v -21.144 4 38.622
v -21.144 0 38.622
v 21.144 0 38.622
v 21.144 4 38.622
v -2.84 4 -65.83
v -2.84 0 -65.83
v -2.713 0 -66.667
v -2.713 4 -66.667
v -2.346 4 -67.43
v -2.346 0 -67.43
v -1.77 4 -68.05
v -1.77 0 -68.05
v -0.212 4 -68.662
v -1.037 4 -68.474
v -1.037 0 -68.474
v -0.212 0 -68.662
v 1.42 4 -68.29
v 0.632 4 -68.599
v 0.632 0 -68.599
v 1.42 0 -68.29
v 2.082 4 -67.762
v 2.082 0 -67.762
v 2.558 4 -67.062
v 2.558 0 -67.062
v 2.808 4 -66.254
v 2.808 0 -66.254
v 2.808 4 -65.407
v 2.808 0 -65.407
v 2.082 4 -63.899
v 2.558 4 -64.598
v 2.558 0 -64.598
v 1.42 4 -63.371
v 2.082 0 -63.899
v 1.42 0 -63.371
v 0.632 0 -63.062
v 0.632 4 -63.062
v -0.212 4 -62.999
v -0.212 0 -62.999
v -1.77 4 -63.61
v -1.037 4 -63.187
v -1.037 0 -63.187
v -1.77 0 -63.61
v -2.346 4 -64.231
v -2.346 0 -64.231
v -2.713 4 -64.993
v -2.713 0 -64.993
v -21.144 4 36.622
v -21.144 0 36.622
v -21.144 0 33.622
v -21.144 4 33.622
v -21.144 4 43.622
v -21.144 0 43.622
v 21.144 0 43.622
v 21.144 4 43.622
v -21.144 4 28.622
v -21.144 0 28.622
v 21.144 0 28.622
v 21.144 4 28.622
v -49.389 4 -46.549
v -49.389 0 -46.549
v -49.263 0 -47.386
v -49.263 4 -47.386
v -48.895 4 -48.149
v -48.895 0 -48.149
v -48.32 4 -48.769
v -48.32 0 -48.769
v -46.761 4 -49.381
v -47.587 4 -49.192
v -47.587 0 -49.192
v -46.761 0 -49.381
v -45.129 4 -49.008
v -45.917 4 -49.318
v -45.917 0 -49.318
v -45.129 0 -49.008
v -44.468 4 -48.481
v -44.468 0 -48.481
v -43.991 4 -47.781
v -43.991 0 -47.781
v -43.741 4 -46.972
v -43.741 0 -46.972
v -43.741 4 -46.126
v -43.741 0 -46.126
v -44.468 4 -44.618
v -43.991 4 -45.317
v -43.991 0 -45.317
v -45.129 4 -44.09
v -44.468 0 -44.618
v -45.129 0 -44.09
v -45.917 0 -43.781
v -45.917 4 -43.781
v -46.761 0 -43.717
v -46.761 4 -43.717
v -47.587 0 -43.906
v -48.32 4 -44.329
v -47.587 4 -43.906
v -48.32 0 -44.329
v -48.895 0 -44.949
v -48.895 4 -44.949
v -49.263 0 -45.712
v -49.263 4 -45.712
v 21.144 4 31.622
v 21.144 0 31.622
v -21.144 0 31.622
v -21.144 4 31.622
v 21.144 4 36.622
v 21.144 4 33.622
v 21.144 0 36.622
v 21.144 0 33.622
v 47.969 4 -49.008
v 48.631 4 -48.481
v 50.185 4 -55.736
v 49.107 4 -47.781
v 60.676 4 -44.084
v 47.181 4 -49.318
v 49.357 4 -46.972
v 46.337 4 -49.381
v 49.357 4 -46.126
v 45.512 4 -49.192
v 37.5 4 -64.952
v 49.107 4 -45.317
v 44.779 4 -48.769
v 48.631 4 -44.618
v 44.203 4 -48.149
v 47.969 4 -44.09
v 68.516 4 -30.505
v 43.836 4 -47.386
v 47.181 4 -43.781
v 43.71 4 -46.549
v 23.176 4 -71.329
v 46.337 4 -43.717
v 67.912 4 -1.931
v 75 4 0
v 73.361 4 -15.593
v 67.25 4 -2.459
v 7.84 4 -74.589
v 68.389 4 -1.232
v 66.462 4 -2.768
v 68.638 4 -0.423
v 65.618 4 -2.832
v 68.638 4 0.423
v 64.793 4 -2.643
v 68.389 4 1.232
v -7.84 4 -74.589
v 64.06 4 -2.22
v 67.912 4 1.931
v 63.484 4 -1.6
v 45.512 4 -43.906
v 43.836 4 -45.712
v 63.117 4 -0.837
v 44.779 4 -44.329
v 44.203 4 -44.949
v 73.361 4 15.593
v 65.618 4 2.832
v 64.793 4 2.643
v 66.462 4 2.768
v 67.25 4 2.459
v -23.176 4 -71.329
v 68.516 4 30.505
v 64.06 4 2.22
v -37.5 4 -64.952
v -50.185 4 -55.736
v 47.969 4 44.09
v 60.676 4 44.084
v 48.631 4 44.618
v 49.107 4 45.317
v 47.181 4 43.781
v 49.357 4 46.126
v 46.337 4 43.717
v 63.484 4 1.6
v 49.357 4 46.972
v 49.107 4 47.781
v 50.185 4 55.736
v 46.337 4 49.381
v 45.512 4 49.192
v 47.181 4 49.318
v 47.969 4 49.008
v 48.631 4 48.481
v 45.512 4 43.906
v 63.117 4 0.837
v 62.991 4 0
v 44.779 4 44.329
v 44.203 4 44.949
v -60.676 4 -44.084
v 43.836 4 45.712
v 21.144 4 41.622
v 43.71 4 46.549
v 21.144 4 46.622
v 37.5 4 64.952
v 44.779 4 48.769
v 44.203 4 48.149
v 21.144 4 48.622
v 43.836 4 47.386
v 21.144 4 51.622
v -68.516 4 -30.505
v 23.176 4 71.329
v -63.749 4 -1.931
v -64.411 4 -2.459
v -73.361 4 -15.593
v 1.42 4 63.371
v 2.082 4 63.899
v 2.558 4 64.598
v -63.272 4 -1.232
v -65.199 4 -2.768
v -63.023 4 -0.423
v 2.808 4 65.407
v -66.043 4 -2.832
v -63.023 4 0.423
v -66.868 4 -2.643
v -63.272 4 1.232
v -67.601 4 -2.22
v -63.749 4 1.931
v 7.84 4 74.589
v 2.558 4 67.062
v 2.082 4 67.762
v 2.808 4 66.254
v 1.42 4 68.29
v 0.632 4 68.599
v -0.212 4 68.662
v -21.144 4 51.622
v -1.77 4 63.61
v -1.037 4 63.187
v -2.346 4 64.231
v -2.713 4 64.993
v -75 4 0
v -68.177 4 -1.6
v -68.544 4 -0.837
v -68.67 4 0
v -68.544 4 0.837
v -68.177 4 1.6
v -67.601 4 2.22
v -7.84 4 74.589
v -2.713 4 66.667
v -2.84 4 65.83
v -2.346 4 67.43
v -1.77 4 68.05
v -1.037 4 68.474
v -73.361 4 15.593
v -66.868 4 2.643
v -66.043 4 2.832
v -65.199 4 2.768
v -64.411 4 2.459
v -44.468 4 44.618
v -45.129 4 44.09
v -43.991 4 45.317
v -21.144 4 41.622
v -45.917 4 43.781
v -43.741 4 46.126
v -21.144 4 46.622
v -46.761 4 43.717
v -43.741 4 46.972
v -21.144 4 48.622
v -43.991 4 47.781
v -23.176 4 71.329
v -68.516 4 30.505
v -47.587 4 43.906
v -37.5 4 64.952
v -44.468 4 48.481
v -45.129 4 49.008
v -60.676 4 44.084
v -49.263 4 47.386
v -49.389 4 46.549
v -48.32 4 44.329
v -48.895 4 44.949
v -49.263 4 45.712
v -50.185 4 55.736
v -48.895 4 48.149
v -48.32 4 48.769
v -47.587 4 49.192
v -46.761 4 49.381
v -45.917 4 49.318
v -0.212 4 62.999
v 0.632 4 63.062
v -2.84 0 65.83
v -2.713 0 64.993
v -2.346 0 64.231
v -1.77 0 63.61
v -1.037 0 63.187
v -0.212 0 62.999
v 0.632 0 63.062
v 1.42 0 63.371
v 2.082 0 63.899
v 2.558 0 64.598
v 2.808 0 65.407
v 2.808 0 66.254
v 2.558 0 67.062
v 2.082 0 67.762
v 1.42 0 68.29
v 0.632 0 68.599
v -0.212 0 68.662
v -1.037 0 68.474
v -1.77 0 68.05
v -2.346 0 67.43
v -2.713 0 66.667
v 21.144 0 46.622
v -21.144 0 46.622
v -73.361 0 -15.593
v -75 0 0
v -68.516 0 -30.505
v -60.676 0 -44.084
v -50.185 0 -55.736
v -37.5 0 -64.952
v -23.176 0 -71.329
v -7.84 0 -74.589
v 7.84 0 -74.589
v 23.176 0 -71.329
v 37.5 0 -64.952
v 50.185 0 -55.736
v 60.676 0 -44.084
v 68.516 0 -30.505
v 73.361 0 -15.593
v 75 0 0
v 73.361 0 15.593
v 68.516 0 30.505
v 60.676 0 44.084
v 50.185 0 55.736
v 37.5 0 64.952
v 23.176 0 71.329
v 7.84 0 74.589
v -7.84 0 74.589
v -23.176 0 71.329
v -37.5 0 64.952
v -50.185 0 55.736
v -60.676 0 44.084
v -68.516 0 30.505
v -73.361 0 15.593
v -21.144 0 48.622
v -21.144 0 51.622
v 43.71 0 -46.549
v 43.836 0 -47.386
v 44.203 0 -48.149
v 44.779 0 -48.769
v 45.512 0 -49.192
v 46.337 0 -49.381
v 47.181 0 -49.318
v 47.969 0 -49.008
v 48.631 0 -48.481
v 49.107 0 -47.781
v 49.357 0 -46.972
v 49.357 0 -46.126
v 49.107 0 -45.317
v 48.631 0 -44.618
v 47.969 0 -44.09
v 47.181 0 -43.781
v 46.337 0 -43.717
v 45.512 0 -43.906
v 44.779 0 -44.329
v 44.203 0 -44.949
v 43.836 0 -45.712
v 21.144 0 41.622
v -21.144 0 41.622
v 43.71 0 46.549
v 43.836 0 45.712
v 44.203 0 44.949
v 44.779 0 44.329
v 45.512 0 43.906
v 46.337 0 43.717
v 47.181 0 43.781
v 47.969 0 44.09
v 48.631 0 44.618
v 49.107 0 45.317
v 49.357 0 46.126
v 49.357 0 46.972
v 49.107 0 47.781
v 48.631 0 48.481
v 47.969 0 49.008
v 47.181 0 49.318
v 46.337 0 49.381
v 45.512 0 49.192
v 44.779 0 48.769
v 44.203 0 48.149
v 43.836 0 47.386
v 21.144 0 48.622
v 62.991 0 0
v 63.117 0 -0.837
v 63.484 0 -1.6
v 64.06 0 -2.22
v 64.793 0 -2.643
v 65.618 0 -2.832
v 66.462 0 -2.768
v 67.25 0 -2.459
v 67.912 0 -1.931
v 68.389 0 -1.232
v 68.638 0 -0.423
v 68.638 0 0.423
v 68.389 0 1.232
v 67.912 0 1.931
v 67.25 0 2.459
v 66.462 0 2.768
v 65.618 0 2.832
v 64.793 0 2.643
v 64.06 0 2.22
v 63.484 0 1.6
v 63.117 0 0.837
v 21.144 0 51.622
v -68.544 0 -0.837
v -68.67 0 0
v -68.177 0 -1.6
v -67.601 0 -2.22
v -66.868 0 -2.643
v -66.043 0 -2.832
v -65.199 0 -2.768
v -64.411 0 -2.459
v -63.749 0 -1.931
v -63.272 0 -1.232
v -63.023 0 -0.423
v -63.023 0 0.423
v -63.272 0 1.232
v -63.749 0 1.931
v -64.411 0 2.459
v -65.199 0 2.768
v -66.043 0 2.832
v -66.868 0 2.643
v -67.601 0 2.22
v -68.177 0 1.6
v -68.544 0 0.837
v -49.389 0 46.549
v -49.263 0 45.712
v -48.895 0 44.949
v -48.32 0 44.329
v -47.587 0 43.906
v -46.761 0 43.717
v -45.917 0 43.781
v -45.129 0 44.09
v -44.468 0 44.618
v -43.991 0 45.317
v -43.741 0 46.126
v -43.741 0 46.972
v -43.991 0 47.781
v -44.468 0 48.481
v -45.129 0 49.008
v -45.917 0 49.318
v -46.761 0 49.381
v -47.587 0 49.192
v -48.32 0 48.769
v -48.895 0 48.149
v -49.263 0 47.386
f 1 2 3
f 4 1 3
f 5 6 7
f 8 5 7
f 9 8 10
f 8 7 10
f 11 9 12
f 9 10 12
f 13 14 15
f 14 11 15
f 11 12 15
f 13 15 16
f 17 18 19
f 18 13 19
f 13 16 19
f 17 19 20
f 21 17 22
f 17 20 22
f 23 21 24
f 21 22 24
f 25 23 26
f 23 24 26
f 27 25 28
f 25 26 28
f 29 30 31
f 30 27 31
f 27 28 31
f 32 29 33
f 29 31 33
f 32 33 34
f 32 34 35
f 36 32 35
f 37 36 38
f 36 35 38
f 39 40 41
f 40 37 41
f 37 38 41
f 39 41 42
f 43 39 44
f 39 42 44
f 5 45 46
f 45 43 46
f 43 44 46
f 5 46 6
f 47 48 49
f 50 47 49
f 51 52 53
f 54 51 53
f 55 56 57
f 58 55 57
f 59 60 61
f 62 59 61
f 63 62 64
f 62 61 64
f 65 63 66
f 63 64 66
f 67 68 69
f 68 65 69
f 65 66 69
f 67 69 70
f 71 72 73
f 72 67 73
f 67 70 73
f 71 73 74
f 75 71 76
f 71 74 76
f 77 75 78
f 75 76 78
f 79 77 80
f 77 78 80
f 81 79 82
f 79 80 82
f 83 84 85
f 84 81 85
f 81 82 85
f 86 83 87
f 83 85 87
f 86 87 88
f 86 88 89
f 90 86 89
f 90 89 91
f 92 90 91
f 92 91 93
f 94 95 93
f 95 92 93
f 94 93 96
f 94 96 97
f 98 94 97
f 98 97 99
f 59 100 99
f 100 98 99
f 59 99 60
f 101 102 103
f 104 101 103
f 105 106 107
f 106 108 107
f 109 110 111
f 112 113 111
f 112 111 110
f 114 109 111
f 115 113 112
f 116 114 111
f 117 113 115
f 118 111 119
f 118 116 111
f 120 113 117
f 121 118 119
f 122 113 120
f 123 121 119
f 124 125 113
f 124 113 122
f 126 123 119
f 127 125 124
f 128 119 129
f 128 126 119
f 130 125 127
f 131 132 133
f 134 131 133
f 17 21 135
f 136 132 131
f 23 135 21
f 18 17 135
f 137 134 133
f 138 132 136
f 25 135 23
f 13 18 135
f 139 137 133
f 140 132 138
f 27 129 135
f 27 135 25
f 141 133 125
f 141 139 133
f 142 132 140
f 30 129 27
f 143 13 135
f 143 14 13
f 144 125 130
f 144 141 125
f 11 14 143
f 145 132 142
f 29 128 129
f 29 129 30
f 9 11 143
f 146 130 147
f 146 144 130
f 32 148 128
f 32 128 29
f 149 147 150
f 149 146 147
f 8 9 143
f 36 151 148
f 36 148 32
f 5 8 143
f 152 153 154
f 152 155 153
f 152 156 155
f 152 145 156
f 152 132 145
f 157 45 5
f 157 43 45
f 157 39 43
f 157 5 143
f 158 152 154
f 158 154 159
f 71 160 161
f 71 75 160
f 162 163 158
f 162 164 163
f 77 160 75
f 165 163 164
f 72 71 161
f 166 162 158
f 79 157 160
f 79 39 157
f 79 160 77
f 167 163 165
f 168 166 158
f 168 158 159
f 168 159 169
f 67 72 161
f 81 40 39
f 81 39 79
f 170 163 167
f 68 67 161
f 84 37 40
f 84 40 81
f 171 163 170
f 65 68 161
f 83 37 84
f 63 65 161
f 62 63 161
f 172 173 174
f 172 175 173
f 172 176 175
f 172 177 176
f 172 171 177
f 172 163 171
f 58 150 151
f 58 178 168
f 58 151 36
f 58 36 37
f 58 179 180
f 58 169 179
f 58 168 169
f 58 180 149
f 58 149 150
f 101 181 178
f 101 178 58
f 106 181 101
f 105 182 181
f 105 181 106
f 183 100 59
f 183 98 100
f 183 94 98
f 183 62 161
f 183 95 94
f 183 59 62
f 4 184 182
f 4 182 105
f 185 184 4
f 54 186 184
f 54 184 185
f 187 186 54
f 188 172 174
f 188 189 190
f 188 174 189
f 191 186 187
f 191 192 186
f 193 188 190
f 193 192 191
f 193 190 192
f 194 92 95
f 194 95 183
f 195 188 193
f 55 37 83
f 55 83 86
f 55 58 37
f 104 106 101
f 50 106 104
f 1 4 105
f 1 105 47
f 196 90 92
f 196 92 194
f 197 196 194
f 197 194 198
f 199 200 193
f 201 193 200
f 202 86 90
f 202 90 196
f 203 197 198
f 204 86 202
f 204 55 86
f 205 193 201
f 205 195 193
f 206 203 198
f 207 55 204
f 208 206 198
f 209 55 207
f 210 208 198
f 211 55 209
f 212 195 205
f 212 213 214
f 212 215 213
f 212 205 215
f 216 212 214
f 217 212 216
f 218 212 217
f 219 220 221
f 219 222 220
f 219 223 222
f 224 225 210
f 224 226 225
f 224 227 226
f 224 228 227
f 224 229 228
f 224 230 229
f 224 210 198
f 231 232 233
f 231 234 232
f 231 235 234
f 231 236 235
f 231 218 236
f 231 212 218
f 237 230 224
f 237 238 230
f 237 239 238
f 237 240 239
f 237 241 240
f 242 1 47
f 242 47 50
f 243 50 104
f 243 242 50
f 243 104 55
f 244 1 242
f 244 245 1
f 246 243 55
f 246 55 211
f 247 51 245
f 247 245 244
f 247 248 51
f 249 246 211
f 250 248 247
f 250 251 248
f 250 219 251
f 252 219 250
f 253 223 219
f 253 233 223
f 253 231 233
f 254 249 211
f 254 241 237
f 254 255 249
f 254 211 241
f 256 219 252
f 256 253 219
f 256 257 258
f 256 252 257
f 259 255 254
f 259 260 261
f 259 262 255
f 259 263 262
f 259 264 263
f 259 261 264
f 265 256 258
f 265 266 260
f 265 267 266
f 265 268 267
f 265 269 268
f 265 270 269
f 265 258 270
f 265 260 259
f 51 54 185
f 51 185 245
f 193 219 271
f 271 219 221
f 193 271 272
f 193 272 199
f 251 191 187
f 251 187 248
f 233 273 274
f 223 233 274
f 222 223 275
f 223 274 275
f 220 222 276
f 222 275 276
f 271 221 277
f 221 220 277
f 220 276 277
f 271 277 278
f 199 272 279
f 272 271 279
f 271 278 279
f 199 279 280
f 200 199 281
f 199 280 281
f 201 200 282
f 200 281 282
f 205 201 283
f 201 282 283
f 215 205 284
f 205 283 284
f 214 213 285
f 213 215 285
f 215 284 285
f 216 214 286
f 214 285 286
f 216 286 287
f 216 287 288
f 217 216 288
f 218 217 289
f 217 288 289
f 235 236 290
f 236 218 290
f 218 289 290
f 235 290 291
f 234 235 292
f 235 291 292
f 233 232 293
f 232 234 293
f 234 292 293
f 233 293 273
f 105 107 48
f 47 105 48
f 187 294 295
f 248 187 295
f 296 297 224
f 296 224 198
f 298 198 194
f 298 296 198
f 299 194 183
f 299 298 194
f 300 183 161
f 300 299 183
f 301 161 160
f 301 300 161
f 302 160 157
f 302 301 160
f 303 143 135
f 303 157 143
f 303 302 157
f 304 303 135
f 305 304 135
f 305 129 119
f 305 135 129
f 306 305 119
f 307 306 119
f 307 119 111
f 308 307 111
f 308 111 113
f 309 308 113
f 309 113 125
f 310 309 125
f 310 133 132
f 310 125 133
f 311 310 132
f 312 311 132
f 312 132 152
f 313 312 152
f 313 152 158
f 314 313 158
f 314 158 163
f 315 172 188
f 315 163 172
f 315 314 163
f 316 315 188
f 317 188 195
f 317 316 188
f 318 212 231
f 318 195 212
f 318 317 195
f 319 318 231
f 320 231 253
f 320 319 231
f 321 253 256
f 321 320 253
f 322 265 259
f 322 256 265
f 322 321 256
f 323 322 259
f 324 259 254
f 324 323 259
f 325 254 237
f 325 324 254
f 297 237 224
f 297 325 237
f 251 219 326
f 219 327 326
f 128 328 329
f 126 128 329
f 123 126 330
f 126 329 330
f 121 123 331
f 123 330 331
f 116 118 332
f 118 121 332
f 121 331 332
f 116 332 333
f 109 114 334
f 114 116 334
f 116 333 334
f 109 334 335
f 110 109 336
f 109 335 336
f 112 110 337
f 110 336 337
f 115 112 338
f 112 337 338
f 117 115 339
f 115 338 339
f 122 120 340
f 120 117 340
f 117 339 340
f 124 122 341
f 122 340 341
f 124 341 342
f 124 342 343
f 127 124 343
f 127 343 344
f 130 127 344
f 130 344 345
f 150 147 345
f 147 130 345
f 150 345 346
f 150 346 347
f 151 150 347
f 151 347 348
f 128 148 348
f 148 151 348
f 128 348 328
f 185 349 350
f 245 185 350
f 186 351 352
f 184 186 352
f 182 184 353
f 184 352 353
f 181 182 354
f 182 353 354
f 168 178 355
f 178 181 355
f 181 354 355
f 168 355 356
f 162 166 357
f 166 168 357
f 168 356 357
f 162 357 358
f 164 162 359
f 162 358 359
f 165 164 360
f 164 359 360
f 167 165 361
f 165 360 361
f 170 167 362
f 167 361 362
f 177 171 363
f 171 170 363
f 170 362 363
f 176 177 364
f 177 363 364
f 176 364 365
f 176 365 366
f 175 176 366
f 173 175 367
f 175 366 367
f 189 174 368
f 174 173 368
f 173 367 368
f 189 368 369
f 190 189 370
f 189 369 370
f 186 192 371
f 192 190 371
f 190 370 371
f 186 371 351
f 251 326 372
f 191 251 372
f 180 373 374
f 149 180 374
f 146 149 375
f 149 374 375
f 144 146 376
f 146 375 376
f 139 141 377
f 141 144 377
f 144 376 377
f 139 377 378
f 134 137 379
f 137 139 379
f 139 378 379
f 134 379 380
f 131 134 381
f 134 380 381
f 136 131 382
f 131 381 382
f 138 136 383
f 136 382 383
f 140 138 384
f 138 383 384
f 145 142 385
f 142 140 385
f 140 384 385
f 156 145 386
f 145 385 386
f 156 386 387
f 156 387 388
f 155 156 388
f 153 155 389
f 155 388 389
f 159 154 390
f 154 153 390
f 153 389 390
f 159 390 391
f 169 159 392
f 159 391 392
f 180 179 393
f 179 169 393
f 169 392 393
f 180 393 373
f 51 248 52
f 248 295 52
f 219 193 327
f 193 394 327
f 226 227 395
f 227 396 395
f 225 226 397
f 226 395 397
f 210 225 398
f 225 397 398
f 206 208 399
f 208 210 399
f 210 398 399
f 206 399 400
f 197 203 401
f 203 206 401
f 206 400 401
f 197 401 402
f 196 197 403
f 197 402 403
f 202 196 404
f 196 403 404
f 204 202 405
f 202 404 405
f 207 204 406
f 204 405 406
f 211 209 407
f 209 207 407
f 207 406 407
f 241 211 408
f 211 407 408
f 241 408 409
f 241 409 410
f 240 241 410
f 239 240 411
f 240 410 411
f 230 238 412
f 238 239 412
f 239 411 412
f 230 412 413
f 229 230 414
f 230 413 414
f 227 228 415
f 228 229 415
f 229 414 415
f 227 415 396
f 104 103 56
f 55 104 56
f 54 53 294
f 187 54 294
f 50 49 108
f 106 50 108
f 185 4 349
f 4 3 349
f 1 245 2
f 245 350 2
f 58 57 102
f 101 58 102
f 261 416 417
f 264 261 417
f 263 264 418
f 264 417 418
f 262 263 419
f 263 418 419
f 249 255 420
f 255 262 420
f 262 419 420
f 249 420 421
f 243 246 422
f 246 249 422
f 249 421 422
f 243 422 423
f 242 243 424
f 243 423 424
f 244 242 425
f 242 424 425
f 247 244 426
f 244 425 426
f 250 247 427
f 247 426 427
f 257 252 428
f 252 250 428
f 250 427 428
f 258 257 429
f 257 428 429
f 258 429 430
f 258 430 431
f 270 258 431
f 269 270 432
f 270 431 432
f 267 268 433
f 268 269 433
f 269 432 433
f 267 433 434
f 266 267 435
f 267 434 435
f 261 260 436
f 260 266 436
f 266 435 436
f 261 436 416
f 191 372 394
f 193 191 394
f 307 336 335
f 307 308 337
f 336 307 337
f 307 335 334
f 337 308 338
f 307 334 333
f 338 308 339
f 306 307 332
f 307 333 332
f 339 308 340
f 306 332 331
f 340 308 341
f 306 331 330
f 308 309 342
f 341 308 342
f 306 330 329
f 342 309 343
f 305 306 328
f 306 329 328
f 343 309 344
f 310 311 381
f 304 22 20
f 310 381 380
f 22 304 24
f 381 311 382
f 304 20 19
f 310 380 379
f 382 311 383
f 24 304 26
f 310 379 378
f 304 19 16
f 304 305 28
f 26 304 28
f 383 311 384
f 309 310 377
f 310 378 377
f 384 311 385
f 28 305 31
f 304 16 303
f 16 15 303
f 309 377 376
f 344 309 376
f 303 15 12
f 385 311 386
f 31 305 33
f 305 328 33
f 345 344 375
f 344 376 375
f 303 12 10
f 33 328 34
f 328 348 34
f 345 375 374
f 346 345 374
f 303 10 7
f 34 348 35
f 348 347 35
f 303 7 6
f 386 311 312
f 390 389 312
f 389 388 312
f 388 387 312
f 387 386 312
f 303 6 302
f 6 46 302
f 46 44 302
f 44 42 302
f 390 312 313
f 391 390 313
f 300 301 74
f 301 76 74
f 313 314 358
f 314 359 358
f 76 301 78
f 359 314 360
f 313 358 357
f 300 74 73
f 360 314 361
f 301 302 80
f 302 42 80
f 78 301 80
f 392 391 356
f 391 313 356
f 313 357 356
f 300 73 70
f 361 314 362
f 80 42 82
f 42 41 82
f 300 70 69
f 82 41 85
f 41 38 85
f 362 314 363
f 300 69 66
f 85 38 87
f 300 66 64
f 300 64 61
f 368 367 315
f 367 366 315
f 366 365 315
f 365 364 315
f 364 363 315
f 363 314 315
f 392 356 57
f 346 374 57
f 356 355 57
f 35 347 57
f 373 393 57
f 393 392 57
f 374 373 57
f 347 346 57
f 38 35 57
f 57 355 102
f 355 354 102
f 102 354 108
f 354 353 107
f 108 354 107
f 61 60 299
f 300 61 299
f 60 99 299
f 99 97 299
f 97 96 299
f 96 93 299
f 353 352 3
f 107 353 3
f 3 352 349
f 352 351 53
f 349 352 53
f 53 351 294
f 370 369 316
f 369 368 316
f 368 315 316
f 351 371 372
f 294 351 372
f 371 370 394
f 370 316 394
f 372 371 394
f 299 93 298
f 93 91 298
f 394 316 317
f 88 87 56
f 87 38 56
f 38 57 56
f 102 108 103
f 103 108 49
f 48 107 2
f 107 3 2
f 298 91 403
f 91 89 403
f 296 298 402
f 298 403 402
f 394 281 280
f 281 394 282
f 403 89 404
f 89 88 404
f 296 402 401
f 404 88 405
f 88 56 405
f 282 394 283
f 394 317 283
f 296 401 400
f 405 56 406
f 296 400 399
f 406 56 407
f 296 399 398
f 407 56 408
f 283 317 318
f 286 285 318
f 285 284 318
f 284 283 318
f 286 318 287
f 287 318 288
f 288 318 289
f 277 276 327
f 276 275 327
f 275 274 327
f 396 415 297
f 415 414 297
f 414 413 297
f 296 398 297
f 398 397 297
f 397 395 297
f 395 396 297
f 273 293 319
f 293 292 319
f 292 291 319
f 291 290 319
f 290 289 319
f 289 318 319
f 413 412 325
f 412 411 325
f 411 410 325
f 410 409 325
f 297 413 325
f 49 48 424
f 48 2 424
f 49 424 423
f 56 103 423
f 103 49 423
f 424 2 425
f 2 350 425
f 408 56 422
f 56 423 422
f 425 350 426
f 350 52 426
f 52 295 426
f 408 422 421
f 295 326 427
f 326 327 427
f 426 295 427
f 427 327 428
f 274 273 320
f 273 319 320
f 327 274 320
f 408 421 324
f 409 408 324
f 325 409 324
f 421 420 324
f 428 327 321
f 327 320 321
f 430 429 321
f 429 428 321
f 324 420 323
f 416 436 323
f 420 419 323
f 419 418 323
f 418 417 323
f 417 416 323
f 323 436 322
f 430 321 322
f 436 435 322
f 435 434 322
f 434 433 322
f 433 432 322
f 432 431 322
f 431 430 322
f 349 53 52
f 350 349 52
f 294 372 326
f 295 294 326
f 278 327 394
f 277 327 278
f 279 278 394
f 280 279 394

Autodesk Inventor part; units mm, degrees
ref_plane "YZ Plane" through (0, 0, 0) normal (1, 0, 0) x (0, 1, 0)
ref_plane "XZ Plane" through (0, 0, 0) normal (0, 1, 0) x (-1, 0, 0)
ref_plane "XY Plane" through (0, 0, 0) normal (0, 0, 1) x (1, 0, 0)
sketch "Sketch1" plane through (0, 0, 0) normal (0, 1, 0) x (-1, 0, 0)
  circle A0 centre (0, 0) radius 75
  circle A1 centre (0, 65.8304) radius 2.8396
  circle A2 centre (-46.5491, 46.5491) radius 2.8396
  circle A3 centre (-65.8304, 0) radius 2.8396
  circle A4 centre (-46.5491, -46.5491) radius 2.8396
  circle A5 centre (0, -65.8304) radius 2.8396
  circle A6 centre (46.5491, -46.5491) radius 2.8396
  circle A7 centre (65.8304, 0) radius 2.8396
  circle A8 centre (46.5491, 46.5491) radius 2.8396
  line L0 (-21.1442, 51.6217) -> (21.1442, 51.6217)
  line L1 (21.1442, 51.6217) -> (21.1442, 48.6217)
  line L2 (21.1442, 48.6217) -> (-21.1442, 48.6217)
  line L3 (-21.1442, 48.6217) -> (-21.1442, 51.6217)
  line L4 (-21.1442, 51.6217) -> (21.1442, 48.6217) construction
  line L5 (21.1442, 51.6217) -> (-21.1442, 48.6217) construction
  line L6 (-21.1442, 46.6217) -> (21.1442, 46.6217)
  line L7 (21.1442, 46.6217) -> (21.1442, 43.6217)
  line L8 (21.1442, 43.6217) -> (-21.1442, 43.6217)
  line L9 (-21.1442, 43.6217) -> (-21.1442, 46.6217)
  line L10 (-21.1442, 46.6217) -> (21.1442, 43.6217) construction
  line L11 (21.1442, 46.6217) -> (-21.1442, 43.6217) construction
  line L12 (-21.1442, 41.6217) -> (21.1442, 41.6217)
  line L13 (21.1442, 41.6217) -> (21.1442, 38.6217)
  line L14 (21.1442, 38.6217) -> (-21.1442, 38.6217)
  line L15 (-21.1442, 38.6217) -> (-21.1442, 41.6217)
  line L16 (-21.1442, 41.6217) -> (21.1442, 38.6217) construction
  line L17 (21.1442, 41.6217) -> (-21.1442, 38.6217) construction
  line L18 (-21.1442, 36.6217) -> (21.1442, 36.6217)
  line L19 (21.1442, 33.6217) -> (-21.1442, 33.6217)
  line L20 (-21.1442, 33.6217) -> (-21.1442, 36.6217)
  line L21 (-21.1442, 36.6217) -> (21.1442, 33.6217) construction
  line L22 (21.1442, 36.6217) -> (-21.1442, 33.6217) construction
  line L23 (-21.1442, 31.6217) -> (21.1442, 31.6217)
  line L24 (21.1442, 28.6217) -> (-21.1442, 28.6217)
  line L25 (-21.1442, 28.6217) -> (-21.1442, 31.6217)
  line L26 (-21.1442, 31.6217) -> (21.1442, 28.6217) construction
  line L27 (21.1442, 31.6217) -> (-21.1442, 28.6217) construction
  line L28 (21.1442, 36.6217) -> (21.1442, 33.6217)
  line L29 (21.1442, 31.6217) -> (21.1442, 28.6217)
  point P0 (0, 50.1217)
  point P1 (0, 45.1217)
  point P2 (0, 40.1217)
  point P3 (0, 35.1217)
  point P4 (0, 30.1217)
  dimension "d0" = 150
  dimension "d3" = 360
  dimension "d5" = 3
  dimension "d6" = 3
  dimension "d7" = 3
  dimension "d8" = 2
  dimension "d9" = 2
  dimension "d12" = 3
  dimension "d15" = 3
  dimension "d16" = 2
  dimension "d17" = 2
extrude "Extrusion1" add sketch "Sketch1" along normal blind 4
sketch "Sketch2" plane through (0, 4, 0) normal (0, 1, 0) x (1, 0, 0)
  point P0 (0, 0)
properties part number "Baseplate"
